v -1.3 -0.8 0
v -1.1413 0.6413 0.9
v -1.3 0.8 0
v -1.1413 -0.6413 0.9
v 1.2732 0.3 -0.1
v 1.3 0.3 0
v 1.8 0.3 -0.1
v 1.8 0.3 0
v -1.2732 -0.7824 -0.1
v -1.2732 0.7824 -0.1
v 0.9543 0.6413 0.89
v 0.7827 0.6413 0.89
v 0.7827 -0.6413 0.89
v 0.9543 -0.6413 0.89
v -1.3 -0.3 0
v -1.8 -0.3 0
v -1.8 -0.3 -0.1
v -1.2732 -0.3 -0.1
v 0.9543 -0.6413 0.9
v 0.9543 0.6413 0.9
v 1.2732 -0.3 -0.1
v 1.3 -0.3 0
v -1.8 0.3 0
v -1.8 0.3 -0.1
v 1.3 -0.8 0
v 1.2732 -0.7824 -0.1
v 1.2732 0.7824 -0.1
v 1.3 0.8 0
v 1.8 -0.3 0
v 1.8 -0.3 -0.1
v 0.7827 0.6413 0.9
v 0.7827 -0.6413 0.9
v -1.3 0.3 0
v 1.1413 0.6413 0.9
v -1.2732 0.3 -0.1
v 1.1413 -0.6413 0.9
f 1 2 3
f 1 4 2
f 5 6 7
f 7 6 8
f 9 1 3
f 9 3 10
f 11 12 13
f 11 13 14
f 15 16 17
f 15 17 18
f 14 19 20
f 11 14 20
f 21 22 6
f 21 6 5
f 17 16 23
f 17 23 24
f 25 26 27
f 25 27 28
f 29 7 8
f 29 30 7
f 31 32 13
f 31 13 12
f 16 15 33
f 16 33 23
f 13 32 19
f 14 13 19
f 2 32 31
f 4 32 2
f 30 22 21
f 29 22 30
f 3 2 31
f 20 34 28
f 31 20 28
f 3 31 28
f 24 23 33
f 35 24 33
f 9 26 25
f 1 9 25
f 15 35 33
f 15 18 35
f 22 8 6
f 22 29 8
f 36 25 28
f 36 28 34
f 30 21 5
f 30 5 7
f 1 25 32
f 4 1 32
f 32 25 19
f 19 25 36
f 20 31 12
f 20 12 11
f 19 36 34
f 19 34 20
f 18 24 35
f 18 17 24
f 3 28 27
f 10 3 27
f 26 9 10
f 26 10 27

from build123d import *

# Parameters (mm, degrees)
F1_DEPTH      = 0.8
F3_DEPTH      = 1.301
F3_DEPTH_BACK = 1.301
F5_DEPTH      = 0.3
F6_W          = 0.1715559629
F6_H          = 1.2826114347
F7_DEPTH      = 0.01


with BuildPart() as f1:
    # F0 (on Front) → F1 (new body, symmetric)
    with BuildSketch(Plane.XZ):
        Polygon((-1.1413057174, 0.9), (-1.3, 0), (1.3, 0), (1.1413057174, 0.9), align=None)
        Polygon((1.3, 0), (-1.3, 0), (-1.2732050808, -0.1), (1.2732050808, -0.1), align=None)
    extrude(amount=F1_DEPTH, both=True)

    # F2 (on Right) → F3 (cut, two sides)
    with BuildSketch(Plane.YZ) as f3_sk:
        Polygon((-0.6413057174, 0.9), (-0.8, 0.9), (-0.8, 0), align=None)
        Polygon((0.8, 0.9), (0.6413057174, 0.9), (0.8, 0), align=None)
        Polygon((-0.7823673019, -0.1), (-0.8, 0), (-0.8, -0.1), align=None)
        Polygon((0.8, -0.1), (0.8, 0), (0.7823673019, -0.1), align=None)
    extrude(amount=-F3_DEPTH, mode=Mode.SUBTRACT)
    extrude(f3_sk.sketch, amount=F3_DEPTH_BACK, mode=Mode.SUBTRACT)

    # F6 (on face) → F7 (cut)
    with BuildSketch(Plane.XY.offset(0.9)):
        with Locations((0.8685019275, 0)):
            Rectangle(F6_W, F6_H)
    extrude(amount=-F7_DEPTH, mode=Mode.SUBTRACT)


with BuildPart() as f5:
    # F4 (on Front) → F5 (new body, symmetric)
    with BuildSketch(Plane.XZ):
        Polygon((1.8, 0), (1.3, 0), (1.2732050808, -0.1), (1.8, -0.1), align=None)
    extrude(amount=F5_DEPTH, both=True)


with BuildPart() as f5b:
    # F4 (on Front) → F5, piece 2 (new body, symmetric)
    with BuildSketch(Plane.XZ):
        Polygon((-1.2732050808, -0.1), (-1.3, 0), (-1.8, 0), (-1.8, -0.1), align=None)
    extrude(amount=F5_DEPTH, both=True)


solid = Compound([f1.part, f5.part, f5b.part])
